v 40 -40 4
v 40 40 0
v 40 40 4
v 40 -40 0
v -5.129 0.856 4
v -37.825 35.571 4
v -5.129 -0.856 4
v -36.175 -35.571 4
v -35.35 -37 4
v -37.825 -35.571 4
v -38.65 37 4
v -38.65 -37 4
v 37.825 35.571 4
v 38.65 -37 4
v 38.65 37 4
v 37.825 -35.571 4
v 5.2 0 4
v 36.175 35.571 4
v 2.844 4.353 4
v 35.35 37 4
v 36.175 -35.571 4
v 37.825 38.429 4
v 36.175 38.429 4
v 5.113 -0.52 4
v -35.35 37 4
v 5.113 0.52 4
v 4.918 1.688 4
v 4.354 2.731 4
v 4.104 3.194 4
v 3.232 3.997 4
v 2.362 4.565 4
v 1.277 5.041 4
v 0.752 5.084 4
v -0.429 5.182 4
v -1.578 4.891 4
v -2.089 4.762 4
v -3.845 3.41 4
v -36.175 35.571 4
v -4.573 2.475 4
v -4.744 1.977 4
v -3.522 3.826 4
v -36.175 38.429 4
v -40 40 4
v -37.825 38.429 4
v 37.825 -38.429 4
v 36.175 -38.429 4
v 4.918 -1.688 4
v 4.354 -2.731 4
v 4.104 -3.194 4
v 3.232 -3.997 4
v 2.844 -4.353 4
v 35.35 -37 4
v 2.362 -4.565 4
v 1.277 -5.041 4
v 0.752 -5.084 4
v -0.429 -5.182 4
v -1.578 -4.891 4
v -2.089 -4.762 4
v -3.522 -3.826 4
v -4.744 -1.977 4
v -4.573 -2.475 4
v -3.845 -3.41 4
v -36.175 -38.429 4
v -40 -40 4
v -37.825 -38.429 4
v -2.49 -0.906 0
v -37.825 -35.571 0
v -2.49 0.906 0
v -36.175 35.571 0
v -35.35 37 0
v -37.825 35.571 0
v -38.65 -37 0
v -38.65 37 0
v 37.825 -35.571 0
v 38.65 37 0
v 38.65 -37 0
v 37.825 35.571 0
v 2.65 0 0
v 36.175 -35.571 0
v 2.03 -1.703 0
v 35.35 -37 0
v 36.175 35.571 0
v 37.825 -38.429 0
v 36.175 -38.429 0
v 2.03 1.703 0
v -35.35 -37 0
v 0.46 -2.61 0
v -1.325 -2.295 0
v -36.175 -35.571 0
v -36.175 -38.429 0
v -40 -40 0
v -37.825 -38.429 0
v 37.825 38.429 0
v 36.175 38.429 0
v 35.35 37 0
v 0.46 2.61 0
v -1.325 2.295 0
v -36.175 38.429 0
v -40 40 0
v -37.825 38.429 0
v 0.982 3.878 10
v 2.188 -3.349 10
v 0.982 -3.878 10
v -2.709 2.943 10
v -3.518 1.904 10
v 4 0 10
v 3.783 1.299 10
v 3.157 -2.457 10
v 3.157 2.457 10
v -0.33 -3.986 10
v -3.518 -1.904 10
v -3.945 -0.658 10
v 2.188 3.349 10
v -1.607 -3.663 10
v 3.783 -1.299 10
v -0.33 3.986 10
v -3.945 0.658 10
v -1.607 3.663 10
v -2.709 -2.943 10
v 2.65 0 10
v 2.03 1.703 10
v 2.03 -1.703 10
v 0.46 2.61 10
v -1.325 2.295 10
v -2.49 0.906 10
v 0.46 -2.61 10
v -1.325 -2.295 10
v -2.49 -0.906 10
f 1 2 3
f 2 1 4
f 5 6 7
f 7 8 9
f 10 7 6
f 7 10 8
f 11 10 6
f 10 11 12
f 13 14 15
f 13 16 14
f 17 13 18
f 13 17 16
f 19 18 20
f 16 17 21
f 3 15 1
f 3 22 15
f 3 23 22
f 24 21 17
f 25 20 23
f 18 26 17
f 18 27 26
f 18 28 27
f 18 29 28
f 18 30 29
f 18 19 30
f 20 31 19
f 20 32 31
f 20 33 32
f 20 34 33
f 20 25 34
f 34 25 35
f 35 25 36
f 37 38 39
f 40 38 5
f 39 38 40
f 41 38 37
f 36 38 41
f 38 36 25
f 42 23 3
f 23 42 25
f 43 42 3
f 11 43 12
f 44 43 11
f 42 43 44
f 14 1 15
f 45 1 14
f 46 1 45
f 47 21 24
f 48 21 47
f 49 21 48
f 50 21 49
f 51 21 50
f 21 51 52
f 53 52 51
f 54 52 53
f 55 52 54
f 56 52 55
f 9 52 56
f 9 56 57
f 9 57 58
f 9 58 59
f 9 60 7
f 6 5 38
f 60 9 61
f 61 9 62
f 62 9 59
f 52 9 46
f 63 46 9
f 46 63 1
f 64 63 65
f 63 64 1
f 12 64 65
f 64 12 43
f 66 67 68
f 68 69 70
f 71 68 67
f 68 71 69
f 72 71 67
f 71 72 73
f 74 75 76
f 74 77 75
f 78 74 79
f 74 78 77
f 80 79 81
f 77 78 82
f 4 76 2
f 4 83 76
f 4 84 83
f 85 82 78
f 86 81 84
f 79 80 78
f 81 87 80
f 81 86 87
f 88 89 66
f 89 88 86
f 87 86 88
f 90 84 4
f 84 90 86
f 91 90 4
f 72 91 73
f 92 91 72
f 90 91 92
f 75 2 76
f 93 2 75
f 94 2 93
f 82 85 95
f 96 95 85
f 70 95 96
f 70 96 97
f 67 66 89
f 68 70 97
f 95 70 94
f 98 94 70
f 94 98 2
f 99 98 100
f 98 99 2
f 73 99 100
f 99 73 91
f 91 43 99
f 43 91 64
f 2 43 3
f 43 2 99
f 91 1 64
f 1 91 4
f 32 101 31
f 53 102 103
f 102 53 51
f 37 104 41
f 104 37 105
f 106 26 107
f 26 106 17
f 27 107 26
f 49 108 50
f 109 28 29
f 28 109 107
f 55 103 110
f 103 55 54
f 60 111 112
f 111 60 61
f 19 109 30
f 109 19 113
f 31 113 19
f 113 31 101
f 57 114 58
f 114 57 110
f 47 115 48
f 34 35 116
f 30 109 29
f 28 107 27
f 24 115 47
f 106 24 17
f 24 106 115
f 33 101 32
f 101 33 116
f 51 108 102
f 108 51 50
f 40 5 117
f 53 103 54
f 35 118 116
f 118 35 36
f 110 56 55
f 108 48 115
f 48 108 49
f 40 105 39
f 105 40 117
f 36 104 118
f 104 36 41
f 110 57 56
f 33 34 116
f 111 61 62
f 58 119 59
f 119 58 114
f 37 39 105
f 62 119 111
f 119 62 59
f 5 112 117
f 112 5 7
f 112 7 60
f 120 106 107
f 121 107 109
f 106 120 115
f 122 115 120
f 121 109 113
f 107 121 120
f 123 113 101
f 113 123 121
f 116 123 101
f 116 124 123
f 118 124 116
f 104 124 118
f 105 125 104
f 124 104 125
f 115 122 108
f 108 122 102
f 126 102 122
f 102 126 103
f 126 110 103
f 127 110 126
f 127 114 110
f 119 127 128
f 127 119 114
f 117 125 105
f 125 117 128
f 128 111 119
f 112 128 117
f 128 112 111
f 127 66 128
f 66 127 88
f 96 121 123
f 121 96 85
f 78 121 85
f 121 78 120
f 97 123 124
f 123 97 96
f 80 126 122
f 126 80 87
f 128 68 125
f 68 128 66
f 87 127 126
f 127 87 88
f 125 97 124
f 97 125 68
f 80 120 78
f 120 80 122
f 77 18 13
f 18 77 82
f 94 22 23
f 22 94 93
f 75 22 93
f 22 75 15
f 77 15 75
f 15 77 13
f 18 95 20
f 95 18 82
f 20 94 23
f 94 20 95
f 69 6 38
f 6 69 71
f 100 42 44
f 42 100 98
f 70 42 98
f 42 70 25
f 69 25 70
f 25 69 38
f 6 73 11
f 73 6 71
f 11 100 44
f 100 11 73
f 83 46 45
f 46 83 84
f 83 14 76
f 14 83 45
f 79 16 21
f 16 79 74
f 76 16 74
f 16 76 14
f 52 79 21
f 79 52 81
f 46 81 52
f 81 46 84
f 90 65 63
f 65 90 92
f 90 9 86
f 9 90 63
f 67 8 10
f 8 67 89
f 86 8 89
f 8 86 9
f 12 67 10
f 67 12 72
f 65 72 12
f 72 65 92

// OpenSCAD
difference()
{
union()
    {
standBTC();
    cylinder(h=10, r1=6, r2 =4);
    }
    cylinder(r=5.3/2, h=18);
    
    translate([37,37,0])
    cylinder(r=3.3/2, h=9);
    translate([-37,37,0])
    cylinder(r=3.3/2, h=9);
    translate([37,-37,0])
    cylinder(r=3.3/2, h=9);
    translate([-37,-37,0])
    cylinder(r=3.3/2, h=9);
    

}  

module standBTC()
{
translate([-40,-40,0])
cube([80,80,4]);
//coin();
}
module coin()
{


rotate([0,0,45])
translate([0,0,43])
    {
union()
        {
logo();
translate([0,5,0])
rotate([90,0,0])
cylinder(h=10, r=50);
            
}
}
}




module oldlogo()
{
import("logo3.stl");
}
module logo()
{
    import("btclogo2.stl");
    }
